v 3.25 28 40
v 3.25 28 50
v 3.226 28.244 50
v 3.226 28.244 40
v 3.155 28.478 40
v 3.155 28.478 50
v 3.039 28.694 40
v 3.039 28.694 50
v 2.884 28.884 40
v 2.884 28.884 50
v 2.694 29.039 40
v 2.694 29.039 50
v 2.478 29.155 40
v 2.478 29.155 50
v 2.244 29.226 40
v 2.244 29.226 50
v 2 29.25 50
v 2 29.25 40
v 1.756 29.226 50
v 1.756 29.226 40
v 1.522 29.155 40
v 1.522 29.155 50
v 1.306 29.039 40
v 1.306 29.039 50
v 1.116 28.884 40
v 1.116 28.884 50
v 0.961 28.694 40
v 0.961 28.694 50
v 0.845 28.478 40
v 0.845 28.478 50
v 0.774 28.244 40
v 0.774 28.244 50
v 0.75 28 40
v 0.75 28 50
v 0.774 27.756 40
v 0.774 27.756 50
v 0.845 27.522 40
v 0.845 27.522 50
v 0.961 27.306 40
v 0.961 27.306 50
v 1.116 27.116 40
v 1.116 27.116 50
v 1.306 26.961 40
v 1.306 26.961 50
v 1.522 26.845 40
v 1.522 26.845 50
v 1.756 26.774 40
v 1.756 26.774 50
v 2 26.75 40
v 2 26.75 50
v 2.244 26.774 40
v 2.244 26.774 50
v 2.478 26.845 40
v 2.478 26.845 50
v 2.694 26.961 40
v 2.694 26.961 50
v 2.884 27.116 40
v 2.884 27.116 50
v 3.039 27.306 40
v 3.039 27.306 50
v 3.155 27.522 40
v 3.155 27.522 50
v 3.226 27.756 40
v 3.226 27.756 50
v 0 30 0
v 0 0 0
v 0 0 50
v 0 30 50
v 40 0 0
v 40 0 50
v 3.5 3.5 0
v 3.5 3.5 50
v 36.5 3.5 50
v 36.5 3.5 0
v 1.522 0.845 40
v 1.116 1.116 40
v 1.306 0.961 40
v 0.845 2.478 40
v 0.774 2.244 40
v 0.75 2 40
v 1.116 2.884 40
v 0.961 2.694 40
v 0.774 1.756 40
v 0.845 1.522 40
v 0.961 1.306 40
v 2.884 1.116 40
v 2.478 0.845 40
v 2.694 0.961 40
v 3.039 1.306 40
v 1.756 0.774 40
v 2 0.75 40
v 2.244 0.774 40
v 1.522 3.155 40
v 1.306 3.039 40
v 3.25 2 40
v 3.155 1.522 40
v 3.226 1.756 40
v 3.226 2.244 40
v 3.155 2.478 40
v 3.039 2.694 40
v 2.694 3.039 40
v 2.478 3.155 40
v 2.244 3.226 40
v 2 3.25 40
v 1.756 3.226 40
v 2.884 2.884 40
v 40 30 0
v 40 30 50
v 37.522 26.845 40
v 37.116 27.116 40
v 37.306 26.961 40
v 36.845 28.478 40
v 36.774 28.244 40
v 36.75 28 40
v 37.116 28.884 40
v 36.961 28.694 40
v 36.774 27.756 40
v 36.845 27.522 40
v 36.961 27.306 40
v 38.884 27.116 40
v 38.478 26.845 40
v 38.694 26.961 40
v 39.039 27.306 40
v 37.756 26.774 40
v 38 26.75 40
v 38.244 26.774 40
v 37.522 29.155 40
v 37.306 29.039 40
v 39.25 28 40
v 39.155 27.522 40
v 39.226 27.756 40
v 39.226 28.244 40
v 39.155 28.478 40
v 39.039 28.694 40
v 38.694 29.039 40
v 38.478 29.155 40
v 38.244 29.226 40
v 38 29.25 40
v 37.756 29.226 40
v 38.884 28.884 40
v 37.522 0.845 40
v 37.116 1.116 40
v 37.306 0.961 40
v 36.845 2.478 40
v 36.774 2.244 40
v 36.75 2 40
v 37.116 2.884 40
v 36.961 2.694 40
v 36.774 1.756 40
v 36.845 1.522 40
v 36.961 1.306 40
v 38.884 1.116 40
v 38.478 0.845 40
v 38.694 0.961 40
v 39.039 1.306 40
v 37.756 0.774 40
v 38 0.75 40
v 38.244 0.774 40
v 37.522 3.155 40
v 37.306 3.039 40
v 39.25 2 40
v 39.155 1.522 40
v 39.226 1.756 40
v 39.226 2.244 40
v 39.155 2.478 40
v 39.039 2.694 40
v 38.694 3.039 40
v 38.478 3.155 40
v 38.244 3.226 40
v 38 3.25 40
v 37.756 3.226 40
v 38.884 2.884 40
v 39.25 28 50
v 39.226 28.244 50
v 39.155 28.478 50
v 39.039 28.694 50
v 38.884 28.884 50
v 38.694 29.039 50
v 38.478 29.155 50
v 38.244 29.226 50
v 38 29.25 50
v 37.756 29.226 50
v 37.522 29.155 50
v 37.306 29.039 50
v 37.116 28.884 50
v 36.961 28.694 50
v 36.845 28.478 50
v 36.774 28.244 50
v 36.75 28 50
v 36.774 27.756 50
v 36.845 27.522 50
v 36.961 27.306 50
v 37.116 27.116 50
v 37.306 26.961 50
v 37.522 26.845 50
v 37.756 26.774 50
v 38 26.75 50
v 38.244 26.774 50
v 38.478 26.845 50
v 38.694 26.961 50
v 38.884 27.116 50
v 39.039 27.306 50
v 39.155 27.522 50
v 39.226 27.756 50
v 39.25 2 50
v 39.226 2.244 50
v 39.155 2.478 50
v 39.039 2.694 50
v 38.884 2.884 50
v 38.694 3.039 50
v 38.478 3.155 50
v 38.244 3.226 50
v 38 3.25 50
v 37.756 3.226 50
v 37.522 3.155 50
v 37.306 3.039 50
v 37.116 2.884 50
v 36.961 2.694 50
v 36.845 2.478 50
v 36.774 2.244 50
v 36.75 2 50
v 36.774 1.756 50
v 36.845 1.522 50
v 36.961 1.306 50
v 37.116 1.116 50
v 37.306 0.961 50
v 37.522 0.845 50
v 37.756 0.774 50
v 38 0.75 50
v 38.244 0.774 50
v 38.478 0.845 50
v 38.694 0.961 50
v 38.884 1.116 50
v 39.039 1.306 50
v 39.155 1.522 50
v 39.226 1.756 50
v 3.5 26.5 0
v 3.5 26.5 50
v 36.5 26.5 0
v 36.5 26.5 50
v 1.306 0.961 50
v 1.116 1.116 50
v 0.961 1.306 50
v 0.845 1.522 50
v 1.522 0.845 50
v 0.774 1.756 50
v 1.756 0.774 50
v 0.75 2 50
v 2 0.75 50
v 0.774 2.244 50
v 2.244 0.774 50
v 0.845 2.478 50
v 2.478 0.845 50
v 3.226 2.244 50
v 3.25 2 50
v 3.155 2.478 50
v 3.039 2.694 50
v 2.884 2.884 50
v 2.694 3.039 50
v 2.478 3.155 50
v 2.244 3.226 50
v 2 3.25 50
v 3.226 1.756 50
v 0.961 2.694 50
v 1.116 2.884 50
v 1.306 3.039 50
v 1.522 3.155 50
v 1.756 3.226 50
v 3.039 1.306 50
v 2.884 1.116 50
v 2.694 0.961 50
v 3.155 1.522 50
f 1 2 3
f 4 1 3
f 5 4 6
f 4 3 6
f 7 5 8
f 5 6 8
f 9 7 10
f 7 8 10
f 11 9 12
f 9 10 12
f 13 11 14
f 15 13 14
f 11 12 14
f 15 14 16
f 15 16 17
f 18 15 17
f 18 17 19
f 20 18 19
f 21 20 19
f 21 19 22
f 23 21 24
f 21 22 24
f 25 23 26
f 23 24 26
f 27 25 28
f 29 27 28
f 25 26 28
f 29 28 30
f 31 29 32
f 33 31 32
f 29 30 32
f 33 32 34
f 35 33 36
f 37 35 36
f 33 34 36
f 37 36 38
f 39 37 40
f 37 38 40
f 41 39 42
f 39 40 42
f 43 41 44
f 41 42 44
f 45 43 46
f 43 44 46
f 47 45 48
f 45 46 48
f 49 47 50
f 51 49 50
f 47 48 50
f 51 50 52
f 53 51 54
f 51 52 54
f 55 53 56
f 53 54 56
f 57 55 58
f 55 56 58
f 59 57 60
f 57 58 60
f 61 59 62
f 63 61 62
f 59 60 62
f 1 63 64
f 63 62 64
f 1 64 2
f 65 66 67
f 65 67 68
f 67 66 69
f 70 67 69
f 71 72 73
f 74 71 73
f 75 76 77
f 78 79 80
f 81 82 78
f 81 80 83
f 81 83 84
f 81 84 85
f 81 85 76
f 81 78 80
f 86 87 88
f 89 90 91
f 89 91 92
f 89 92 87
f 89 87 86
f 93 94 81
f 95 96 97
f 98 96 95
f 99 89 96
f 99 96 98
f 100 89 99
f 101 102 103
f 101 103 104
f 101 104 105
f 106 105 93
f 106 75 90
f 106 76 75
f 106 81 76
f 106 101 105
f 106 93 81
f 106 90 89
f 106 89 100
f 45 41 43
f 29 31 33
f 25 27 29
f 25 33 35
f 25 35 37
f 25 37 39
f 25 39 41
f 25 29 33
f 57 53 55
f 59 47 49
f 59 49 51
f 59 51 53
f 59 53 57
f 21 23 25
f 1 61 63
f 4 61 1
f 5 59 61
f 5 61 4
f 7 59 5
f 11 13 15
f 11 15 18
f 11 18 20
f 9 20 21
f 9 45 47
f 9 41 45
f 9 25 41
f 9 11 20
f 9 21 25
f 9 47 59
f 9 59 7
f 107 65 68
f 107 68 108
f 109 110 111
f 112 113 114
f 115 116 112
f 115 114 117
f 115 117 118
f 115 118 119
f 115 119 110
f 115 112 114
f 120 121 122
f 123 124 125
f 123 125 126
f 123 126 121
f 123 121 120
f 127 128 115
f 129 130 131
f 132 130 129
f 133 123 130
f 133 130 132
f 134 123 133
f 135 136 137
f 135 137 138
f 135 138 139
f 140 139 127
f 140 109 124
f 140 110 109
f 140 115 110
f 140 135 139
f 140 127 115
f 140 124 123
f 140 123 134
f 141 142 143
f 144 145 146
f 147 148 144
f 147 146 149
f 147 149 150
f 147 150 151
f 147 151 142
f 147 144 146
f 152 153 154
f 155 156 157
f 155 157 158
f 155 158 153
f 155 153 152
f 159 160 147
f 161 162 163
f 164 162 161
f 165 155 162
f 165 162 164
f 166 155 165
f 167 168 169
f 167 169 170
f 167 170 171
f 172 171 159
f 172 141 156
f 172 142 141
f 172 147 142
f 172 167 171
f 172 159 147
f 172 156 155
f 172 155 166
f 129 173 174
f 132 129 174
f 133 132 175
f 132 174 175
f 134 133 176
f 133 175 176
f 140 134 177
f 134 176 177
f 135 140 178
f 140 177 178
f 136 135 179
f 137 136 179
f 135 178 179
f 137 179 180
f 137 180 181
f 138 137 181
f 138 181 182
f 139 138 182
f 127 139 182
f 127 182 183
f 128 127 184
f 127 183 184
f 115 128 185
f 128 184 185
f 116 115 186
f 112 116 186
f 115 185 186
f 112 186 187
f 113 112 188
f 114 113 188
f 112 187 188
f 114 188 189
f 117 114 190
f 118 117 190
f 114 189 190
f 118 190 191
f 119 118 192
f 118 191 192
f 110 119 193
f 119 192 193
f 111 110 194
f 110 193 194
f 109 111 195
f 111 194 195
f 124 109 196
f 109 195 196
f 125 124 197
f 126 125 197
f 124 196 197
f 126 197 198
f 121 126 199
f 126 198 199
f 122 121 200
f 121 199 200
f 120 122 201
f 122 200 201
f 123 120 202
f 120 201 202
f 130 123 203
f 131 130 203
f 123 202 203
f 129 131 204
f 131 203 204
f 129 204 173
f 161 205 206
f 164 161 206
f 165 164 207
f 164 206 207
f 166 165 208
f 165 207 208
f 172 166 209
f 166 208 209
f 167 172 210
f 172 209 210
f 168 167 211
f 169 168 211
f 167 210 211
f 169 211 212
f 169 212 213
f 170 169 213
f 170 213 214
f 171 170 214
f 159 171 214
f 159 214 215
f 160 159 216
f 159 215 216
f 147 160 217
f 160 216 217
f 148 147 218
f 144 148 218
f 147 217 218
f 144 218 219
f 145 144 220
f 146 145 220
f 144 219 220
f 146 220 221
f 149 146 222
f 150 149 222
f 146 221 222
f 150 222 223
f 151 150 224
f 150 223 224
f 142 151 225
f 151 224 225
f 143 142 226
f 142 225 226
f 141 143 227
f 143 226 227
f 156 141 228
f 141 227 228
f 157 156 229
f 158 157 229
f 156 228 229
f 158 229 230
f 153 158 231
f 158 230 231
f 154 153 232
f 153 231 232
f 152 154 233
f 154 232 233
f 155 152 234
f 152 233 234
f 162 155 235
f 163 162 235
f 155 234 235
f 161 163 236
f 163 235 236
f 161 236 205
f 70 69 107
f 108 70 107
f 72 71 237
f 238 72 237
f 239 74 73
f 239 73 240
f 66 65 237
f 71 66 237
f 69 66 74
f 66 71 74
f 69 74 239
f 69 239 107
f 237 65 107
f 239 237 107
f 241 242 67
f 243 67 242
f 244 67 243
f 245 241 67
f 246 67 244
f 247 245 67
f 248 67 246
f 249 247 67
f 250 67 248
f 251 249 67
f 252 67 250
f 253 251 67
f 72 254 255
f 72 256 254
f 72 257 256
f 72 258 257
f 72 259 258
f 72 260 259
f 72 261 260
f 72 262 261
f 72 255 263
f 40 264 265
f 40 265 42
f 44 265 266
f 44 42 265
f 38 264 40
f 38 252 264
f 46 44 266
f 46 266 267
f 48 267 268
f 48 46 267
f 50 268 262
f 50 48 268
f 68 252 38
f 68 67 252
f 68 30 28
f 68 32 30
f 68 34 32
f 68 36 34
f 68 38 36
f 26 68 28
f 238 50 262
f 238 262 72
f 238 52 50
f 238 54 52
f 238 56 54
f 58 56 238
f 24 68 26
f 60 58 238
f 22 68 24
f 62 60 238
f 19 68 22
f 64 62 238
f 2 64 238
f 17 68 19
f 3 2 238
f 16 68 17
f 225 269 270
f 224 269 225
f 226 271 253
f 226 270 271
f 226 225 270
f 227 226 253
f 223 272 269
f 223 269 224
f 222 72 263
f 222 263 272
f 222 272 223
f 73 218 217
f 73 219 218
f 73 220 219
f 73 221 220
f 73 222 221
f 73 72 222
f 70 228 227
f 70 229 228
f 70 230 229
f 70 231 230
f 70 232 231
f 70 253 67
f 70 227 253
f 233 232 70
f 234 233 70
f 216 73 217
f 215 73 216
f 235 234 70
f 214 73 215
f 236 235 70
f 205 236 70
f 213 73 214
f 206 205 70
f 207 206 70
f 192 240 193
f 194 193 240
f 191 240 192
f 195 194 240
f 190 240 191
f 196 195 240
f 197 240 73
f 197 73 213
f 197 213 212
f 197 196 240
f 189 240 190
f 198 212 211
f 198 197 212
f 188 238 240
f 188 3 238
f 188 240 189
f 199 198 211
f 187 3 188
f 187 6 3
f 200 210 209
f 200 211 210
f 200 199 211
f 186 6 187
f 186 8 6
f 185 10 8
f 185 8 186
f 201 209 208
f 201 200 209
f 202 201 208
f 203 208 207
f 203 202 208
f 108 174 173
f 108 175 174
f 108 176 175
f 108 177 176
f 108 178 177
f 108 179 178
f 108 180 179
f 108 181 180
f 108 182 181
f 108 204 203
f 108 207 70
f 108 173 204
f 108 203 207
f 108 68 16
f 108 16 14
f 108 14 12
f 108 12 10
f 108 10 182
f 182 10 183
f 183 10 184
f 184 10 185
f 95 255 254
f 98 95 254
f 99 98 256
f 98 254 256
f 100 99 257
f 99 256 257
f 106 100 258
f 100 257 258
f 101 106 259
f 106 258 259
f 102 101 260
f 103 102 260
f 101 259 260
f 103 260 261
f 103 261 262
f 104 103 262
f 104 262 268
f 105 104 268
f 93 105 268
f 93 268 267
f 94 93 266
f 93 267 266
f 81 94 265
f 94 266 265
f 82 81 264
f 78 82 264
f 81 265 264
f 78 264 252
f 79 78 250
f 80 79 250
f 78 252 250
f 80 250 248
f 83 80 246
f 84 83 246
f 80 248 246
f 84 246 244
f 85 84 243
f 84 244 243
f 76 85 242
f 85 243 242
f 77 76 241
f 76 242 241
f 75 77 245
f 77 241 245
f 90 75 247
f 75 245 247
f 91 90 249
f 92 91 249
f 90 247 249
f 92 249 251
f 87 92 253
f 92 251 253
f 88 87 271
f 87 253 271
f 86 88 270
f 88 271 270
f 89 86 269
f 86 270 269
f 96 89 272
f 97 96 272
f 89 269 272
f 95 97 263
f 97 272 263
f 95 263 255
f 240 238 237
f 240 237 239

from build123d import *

# Parameters (mm, degrees)
SKETCH1_W           = 40
SKETCH1_H           = 30
BOSS_EXTRUDE1_DEPTH = 50
SKETCH3_W           = 33
SKETCH3_H           = 23
CUT_EXTRUDE1_DEPTH  = 51
SKETCH4_R           = 1.25
CUT_EXTRUDE2_DEPTH  = 10


with BuildPart() as part:
    # Sketch1 → Boss-Extrude1 (new body)
    with BuildSketch(Plane.XY):
        with Locations((20, 15)):
            Rectangle(SKETCH1_W, SKETCH1_H)
    extrude(amount=BOSS_EXTRUDE1_DEPTH)

    # Sketch3 → Cut-Extrude1 (cut, through all)
    with BuildSketch(Plane.XY.offset(50)):
        with Locations((20, 15)):
            Rectangle(SKETCH3_W, SKETCH3_H)
    extrude(amount=-CUT_EXTRUDE1_DEPTH, mode=Mode.SUBTRACT)

    # Sketch4 → Cut-Extrude2 (cut)
    with BuildSketch(Plane.XY.offset(50)):
        with Locations((38, 28)):
            Circle(SKETCH4_R)
        with Locations((2, 28)):
            Circle(SKETCH4_R)
        with Locations((2, 2)):
            Circle(SKETCH4_R)
        with Locations((38, 2)):
            Circle(SKETCH4_R)
    extrude(amount=-CUT_EXTRUDE2_DEPTH, mode=Mode.SUBTRACT)


solid = part.part
